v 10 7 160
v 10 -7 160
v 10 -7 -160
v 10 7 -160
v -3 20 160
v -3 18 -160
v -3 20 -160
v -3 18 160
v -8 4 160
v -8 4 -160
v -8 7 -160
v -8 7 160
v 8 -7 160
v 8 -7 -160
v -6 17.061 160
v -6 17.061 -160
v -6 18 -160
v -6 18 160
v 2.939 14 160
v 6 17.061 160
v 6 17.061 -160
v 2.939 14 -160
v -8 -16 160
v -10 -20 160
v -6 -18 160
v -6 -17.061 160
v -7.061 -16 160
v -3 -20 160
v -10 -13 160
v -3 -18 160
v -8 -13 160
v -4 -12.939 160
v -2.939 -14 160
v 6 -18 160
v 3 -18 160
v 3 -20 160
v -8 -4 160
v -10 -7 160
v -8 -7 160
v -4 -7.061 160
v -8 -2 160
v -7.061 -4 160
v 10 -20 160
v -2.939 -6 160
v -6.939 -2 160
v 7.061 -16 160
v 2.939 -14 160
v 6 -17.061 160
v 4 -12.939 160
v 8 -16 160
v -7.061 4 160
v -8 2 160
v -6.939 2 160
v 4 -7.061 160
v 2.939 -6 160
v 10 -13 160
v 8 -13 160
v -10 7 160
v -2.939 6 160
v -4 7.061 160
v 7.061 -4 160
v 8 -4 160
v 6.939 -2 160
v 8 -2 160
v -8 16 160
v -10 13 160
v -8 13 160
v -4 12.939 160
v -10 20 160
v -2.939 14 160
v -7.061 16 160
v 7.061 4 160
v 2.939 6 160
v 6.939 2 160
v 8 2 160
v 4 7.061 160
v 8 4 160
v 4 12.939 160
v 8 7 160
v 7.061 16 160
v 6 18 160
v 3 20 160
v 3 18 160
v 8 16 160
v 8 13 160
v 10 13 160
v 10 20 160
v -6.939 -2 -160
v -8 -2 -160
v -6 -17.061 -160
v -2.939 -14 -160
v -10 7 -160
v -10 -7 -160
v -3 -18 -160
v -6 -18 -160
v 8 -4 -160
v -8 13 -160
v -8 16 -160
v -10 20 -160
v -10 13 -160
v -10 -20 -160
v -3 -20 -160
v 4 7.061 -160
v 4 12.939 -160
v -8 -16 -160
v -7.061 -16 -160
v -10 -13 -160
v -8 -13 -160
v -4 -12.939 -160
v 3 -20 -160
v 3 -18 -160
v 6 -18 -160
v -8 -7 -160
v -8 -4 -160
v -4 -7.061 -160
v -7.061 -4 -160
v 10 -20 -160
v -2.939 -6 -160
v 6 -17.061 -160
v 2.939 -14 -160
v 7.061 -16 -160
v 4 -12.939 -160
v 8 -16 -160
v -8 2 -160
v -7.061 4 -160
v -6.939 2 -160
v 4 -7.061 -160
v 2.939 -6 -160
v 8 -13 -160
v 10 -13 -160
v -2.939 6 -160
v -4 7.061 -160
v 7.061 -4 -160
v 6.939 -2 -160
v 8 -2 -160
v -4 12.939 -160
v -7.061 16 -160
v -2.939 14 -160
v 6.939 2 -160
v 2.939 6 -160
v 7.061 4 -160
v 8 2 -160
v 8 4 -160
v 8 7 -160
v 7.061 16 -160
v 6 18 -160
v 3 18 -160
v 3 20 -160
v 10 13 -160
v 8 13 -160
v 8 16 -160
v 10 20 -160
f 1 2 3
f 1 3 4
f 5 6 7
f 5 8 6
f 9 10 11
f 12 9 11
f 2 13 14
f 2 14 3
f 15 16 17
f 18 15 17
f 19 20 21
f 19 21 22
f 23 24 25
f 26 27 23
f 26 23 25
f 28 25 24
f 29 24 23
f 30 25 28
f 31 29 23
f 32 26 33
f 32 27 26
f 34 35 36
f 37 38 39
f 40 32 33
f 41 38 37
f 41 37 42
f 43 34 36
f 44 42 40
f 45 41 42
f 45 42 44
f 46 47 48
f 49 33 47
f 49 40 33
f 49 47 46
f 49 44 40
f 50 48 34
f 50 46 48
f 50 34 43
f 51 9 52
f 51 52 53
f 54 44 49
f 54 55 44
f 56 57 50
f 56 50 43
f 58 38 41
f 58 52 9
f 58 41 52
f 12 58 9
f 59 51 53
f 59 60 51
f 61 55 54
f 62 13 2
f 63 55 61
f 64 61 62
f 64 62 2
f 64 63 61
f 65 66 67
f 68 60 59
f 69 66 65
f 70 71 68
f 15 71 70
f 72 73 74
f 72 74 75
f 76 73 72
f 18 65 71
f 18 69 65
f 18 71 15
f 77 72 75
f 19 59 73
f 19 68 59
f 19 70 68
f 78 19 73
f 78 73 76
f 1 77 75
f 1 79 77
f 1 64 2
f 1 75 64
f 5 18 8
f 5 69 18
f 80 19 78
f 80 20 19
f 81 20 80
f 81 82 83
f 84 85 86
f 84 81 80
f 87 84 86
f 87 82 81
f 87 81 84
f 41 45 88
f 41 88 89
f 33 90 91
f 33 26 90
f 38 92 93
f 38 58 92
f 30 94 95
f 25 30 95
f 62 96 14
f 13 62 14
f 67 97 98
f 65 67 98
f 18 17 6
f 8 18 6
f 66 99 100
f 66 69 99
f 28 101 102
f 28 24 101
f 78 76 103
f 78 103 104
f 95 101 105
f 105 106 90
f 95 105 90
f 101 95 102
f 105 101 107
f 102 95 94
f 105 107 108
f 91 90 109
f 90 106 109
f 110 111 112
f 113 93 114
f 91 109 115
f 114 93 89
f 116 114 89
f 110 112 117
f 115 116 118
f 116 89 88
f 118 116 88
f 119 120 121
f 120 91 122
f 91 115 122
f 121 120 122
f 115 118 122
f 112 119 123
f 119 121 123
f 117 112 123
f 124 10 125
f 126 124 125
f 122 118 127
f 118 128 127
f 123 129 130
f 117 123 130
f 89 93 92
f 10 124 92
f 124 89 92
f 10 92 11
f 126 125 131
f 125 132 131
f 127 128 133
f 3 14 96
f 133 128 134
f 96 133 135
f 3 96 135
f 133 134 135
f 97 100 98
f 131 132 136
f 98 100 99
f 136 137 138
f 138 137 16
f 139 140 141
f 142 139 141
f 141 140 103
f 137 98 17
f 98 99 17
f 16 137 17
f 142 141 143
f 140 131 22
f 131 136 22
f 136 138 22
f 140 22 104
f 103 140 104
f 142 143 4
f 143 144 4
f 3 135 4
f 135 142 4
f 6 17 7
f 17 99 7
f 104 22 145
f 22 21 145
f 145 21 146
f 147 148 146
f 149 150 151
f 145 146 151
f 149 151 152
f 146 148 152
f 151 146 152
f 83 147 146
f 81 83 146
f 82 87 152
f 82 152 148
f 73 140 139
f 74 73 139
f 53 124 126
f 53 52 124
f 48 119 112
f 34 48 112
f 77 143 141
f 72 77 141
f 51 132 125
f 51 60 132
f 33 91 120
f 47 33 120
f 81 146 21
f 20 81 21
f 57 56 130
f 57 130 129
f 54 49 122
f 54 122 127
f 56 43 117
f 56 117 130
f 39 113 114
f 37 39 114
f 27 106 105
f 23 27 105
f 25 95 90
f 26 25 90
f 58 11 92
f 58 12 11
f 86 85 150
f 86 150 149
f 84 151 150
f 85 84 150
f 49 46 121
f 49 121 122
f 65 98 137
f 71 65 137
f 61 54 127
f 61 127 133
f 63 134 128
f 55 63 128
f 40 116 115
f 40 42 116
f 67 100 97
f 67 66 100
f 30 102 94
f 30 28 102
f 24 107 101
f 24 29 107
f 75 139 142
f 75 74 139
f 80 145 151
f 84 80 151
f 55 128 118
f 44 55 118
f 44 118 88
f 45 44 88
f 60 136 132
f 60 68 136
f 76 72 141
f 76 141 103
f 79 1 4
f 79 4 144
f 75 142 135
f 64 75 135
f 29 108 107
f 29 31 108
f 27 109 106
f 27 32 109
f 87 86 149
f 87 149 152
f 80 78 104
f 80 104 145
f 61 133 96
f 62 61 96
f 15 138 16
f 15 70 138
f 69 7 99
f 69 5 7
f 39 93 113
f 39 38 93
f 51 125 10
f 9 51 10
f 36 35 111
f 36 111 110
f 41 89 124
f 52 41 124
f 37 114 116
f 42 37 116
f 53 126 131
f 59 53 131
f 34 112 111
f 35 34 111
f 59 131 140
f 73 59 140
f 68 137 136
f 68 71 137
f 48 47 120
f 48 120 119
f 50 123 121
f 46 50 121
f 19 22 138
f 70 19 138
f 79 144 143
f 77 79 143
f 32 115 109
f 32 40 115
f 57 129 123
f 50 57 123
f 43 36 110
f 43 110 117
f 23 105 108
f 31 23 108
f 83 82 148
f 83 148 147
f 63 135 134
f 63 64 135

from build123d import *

# Parameters (mm, degrees)
BOSS_EXTRUDE1_DEPTH = 160


with BuildPart() as part:
    # Sketch1 → Boss-Extrude1 (new body, symmetric)
    with BuildSketch(Plane.XY):
        Polygon((-6, -17.060660172), (-2.939339828, -14), (2.939339828, -14), (6, -17.060660172), (6, -18), (3, -18), (3, -20), (10, -20), (10, -13), (8, -13), (8, -16), (7.060660172, -16), (4, -12.939339828), (4, -7.060660172), (7.060660172, -4), (8, -4), (8, -7), (10, -7), (10, 7), (8, 7), (8, 4), (7.060660172, 4), (4, 7.060660172), (4, 12.939339828), (7.060660172, 16), (8, 16), (8, 13), (10, 13), (10, 20), (3, 20), (3, 18), (6, 18), (6, 17.060660172), (2.939339828, 14), (-2.939339828, 14), (-6, 17.060660172), (-6, 18), (-3, 18), (-3, 20), (-10, 20), (-10, 13), (-8, 13), (-8, 16), (-7.060660172, 16), (-4, 12.939339828), (-4, 7.060660172), (-7.060660172, 4), (-8, 4), (-8, 7), (-10, 7), (-10, -7), (-8, -7), (-8, -4), (-7.060660172, -4), (-4, -7.060660172), (-4, -12.939339828), (-7.060660172, -16), (-8, -16), (-8, -13), (-10, -13), (-10, -20), (-3, -20), (-3, -18), (-6, -18), align=None)
        Polygon((-6.939339828, -2), (-8, -2), (-8, 2), (-6.939339828, 2), (-2.939339828, 6), (2.939339828, 6), (6.939339828, 2), (8, 2), (8, -2), (6.939339828, -2), (2.939339828, -6), (-2.939339828, -6), align=None, mode=Mode.SUBTRACT)
    extrude(amount=BOSS_EXTRUDE1_DEPTH, both=True)


solid = part.part
